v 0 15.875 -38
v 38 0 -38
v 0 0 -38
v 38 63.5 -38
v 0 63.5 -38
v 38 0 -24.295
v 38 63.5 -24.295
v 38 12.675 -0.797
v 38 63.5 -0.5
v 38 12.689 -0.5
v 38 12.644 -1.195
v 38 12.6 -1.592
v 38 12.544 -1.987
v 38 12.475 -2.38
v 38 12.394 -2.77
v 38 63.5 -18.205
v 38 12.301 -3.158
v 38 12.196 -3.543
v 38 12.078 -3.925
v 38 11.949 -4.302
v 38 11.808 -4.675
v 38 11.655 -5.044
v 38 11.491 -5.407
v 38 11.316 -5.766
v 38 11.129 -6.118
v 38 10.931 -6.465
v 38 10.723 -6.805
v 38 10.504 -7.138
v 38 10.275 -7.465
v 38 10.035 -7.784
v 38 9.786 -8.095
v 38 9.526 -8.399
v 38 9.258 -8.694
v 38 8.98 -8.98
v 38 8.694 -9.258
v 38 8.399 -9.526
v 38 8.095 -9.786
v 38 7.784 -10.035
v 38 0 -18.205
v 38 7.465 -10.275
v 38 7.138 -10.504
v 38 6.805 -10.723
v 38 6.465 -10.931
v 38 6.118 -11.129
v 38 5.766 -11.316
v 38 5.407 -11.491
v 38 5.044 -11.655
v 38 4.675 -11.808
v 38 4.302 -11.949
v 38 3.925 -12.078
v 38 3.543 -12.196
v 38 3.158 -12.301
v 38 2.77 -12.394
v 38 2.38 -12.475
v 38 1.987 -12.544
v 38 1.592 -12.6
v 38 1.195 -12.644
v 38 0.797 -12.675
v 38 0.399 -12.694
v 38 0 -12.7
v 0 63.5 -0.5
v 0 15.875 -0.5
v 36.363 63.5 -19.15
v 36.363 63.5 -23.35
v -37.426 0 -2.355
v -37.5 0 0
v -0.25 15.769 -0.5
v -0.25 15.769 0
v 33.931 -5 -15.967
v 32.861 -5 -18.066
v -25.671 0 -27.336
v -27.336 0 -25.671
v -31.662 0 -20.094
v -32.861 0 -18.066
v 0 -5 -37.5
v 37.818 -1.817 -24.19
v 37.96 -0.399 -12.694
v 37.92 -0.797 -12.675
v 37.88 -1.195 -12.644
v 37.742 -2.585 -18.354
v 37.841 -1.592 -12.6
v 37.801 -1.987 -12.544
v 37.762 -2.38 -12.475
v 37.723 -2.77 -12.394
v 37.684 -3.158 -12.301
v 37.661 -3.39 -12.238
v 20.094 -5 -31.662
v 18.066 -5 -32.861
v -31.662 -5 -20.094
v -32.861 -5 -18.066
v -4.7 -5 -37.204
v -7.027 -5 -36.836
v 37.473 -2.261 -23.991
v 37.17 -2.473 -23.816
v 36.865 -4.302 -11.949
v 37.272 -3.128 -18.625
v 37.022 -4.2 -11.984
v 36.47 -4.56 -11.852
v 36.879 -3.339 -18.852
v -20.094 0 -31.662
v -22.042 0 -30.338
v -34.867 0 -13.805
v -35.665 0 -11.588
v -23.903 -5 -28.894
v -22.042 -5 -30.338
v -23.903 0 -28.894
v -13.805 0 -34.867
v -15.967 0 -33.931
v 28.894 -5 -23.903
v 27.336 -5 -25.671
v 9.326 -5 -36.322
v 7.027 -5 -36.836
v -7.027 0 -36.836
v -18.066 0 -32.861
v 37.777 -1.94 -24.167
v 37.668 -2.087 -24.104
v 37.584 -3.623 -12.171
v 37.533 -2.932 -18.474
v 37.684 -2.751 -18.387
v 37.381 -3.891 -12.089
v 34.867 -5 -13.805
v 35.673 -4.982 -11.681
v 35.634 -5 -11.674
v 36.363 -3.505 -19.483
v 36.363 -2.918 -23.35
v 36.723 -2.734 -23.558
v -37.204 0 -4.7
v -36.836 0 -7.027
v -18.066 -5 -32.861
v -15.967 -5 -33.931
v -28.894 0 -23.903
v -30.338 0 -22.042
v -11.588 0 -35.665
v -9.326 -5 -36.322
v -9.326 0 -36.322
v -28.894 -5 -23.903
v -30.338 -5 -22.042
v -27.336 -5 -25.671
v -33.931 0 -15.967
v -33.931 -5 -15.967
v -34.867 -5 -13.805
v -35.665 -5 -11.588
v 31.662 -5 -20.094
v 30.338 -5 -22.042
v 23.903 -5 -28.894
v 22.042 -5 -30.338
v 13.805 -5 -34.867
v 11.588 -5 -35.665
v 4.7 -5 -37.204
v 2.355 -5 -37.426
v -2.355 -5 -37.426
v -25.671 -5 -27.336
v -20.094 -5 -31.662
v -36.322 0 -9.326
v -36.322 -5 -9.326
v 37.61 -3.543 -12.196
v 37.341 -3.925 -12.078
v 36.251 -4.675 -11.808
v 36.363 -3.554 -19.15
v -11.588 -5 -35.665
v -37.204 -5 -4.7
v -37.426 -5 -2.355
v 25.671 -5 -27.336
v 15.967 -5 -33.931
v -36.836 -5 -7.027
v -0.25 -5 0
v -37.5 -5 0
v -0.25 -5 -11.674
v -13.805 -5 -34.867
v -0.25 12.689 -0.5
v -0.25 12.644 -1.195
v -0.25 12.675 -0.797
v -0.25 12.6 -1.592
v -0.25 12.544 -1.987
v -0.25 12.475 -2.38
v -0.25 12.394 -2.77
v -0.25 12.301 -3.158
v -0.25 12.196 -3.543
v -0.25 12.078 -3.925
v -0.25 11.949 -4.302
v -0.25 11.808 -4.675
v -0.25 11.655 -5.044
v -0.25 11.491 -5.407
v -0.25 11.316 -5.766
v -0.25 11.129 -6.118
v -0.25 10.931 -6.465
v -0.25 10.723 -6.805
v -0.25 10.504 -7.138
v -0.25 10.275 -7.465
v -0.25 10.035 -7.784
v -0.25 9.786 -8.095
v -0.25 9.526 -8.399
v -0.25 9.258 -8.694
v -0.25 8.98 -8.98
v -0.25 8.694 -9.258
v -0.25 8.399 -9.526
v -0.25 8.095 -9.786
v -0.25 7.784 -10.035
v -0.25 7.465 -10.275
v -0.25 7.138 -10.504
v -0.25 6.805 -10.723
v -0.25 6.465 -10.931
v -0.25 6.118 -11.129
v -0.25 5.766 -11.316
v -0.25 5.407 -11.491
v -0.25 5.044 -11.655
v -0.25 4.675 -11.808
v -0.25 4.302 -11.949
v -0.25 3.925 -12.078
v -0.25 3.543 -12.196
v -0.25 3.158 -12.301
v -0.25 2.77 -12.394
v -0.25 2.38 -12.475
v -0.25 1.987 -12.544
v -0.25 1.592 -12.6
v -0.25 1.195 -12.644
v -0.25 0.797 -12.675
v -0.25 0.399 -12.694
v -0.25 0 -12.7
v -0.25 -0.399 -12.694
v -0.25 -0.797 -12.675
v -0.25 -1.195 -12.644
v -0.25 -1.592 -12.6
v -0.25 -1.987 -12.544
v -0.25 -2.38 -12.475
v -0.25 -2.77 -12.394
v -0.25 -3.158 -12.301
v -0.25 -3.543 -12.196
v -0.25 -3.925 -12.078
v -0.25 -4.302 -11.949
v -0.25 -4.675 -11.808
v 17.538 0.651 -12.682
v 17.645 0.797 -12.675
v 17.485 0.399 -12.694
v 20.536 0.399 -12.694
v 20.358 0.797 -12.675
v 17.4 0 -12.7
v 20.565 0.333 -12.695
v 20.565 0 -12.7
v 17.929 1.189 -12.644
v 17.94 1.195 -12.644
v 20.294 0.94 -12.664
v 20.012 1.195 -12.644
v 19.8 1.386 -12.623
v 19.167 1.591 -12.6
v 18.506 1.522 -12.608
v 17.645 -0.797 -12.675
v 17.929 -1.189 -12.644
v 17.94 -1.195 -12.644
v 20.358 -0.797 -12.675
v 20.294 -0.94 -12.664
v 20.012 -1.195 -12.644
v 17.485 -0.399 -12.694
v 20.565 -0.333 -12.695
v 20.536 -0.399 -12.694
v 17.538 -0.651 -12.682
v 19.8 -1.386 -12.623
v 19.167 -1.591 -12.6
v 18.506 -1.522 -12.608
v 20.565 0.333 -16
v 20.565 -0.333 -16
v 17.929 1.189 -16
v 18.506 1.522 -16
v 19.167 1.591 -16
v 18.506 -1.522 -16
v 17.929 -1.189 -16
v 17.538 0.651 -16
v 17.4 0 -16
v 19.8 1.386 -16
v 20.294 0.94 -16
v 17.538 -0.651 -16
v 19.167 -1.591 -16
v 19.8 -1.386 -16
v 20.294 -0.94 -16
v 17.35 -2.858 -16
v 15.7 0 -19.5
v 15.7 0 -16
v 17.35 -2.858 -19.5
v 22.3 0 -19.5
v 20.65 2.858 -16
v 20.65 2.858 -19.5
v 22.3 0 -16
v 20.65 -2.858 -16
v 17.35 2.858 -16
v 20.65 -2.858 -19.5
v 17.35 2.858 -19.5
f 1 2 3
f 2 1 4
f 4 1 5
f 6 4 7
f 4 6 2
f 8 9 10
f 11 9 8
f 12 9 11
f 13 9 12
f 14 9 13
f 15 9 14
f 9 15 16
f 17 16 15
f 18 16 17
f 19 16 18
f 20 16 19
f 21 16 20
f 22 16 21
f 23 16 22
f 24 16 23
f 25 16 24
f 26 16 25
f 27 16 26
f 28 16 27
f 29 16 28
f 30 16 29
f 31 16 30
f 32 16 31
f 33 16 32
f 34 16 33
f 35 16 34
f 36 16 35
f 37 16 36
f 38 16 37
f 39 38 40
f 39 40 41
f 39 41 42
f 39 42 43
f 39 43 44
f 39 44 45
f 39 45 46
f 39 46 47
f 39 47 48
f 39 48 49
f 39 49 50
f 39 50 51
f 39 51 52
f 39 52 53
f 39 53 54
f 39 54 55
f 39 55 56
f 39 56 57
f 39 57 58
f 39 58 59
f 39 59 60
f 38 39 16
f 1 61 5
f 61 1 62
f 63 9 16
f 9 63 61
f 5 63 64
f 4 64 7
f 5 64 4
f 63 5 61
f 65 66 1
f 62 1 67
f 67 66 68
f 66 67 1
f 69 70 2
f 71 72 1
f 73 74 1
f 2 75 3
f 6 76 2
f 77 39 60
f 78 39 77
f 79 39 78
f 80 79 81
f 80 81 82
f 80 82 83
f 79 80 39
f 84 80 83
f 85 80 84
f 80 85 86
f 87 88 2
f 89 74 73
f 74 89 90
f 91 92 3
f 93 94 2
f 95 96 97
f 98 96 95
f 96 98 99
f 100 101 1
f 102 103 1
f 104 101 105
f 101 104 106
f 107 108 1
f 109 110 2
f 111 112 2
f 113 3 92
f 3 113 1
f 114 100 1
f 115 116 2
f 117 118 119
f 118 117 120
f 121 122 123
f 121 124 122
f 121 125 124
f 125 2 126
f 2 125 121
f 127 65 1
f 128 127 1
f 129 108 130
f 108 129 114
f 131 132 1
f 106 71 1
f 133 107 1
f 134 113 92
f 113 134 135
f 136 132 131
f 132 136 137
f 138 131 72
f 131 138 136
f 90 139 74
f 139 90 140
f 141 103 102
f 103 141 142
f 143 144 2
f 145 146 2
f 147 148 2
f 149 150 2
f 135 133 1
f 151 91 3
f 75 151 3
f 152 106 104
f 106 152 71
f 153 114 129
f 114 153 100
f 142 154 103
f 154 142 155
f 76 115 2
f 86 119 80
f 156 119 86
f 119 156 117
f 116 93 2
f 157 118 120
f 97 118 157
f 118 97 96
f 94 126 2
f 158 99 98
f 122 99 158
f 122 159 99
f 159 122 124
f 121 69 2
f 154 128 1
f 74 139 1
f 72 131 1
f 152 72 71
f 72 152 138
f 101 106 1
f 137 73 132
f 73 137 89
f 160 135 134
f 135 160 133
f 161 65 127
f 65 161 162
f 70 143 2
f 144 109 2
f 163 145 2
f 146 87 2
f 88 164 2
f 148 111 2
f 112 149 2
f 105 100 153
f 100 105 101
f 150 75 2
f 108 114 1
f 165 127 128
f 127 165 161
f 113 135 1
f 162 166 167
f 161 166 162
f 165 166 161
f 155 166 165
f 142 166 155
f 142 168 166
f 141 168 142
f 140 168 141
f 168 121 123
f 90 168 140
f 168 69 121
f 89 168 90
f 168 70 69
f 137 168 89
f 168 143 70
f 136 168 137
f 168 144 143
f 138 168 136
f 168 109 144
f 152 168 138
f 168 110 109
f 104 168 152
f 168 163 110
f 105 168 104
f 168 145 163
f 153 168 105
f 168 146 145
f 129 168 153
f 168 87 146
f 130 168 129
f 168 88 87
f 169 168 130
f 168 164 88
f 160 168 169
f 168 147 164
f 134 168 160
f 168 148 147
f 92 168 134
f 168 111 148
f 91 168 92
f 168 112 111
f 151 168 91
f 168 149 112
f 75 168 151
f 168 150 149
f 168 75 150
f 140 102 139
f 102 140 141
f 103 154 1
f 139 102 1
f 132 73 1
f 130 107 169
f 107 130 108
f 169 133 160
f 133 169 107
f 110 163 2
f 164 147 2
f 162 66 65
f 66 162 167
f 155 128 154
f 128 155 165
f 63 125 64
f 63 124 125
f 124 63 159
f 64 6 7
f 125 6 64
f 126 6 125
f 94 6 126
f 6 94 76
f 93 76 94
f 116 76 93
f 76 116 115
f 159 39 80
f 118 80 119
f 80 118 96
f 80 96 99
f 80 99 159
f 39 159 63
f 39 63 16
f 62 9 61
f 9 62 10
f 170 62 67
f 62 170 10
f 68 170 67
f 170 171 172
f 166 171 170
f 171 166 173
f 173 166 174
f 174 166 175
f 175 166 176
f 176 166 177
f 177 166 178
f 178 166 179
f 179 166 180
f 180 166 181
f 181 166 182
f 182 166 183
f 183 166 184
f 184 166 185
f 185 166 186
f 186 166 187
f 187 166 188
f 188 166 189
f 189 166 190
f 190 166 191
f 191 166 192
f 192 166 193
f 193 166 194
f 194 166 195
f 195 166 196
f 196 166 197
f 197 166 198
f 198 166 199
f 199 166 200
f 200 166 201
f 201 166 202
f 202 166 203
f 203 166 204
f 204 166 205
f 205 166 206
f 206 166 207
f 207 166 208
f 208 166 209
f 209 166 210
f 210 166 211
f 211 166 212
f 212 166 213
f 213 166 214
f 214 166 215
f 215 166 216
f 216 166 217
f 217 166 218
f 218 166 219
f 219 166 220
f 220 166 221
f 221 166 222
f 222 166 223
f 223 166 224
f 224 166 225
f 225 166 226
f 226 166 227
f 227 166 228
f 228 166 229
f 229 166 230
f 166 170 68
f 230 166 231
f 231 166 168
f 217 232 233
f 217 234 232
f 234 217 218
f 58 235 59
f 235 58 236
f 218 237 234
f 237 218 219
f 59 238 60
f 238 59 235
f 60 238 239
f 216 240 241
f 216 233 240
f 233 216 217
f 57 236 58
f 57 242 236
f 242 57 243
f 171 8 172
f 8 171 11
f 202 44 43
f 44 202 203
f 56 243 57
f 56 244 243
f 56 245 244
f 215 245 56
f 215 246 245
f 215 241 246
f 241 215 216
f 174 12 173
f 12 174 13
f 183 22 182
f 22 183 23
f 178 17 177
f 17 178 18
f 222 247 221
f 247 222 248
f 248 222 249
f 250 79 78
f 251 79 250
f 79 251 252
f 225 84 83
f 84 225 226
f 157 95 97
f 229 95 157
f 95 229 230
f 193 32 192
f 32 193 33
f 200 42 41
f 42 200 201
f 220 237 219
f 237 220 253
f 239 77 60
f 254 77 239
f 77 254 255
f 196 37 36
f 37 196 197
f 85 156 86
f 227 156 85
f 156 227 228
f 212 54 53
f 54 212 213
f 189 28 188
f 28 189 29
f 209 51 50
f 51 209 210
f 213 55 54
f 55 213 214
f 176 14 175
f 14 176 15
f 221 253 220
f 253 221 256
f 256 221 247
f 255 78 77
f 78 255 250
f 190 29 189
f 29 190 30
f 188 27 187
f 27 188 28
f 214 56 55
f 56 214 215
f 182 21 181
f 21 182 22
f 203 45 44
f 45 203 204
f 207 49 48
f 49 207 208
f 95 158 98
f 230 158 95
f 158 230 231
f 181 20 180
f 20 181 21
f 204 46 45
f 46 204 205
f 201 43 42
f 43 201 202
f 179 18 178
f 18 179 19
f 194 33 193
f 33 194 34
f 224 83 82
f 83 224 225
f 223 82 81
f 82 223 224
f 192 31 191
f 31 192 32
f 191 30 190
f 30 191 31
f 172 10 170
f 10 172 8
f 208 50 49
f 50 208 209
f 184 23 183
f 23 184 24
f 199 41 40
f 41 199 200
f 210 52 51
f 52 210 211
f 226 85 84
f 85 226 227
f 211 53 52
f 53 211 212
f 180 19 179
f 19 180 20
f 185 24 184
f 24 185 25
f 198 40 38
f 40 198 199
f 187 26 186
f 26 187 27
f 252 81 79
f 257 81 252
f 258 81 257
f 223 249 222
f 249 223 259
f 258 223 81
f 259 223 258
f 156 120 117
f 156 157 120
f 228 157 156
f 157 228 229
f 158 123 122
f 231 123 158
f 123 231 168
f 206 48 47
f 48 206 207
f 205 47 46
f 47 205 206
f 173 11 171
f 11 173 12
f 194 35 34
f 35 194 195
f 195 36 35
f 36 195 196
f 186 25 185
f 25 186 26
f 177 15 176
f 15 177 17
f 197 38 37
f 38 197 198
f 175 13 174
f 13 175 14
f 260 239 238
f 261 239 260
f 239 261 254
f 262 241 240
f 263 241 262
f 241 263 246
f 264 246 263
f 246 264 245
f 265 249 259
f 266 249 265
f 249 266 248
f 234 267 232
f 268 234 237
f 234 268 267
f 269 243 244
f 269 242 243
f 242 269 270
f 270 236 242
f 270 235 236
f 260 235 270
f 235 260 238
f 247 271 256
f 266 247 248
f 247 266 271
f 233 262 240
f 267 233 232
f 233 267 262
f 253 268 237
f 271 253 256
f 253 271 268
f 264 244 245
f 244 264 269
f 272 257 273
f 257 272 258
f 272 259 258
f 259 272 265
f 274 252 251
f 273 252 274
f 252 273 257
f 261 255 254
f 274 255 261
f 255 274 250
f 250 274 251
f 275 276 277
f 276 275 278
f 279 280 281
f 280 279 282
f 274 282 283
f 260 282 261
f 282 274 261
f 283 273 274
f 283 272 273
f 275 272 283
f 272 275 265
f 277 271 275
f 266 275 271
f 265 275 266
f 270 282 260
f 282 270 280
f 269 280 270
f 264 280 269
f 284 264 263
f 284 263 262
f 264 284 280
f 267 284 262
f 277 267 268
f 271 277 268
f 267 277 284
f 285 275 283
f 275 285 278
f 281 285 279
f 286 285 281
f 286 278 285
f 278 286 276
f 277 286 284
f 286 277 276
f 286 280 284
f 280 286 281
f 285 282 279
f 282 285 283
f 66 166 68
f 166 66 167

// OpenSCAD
// file: ../888_2003.scad
include <../parameters.scad>

module 888_2003 (coupling_wall_thickness, thickness_between_tubes,draft = true){

//modifikace spojky 666_1004

    bevelled_width = main_tube_outer_diameter + 2*coupling_wall_thickness;

    magnet_displacement = 40;
    wall_thickness = 5;
    screw_length = 30;
    magnet_diameter = 75;
    distance_between_screws = 42.5;


    difference(){

        union(){
            translate([-(coupling_width_666_1004/2), - depth_666_1004 + main_tube_outer_diameter/2 + coupling_wall_thickness,0])
                  cube([coupling_width_666_1004, depth_666_1004, height_666_1004]);


            hull(){

                translate([-(coupling_width_666_1004/2), - depth_666_1004 + main_tube_outer_diameter/2 + coupling_wall_thickness,0])
                      cube([coupling_width_666_1004, depth_666_1004/4, height_666_1004]);

                translate([0, - depth_666_1004 + main_tube_outer_diameter/2 + coupling_wall_thickness , magnet_displacement])
                    rotate([90, 0, 0])
                        cylinder(d = magnet_diameter, h = 5, $fn = draft?50:100);
            }

        }

        // middle cut
        translate ([-0.5, -depth_666_1004 , - global_clearance/2])
            cube ([1, 3*depth_666_1004 + global_clearance, 3* height_666_1004 + global_clearance]);

        //tubes
        translate([0,0,- global_clearance/2])
                cylinder(h = height_666_1004 + global_clearance,r = main_tube_outer_diameter/2, $fn= draft ? 50 : 200);

        //screw
        translate([-coupling_width_666_1004/2 - global_clearance/2,0,height_666_1004/2])
           rotate ([0,90,0])   
                cylinder(h = coupling_width_666_1004 + global_clearance, r = M3_screw_diameter/2, $fn = 15);
                
        //nut
        translate([-coupling_width_666_1004/2 - global_clearance/2,0, height_666_1004/2])
            rotate ([0,90,0])
                cylinder (h = M3_screw_head_height + global_clearance, r = M3_nut_diameter/2, $fn = 6);
        
        translate([coupling_width_666_1004/2 - M3_screw_head_height,0,height_666_1004/2])
           rotate ([0,90,0])
                cylinder (h = M3_screw_head_height + global_clearance, r = M3_nut_diameter/2, $fn = 6);

        translate([distance_between_screws/2, - depth_666_1004 + main_tube_outer_diameter/2, magnet_displacement]) 
            rotate([-90, 0, 0])
            {
                cylinder(d = M4_screw_diameter, h = 10 + global_clearance, $fn=50);
                translate([0,0,5])
                   cylinder(d = M4_nut_diameter, h = 50 * M4_nut_height, $fn = 6);
            }

        translate([- distance_between_screws/2,- depth_666_1004 + main_tube_outer_diameter/2 , magnet_displacement])
            rotate([-90, 0, 0])
            { 
                cylinder(d = M4_screw_diameter, h = 10 + global_clearance, $fn = 50);
                translate([0,0,5])
                    cylinder(d = M4_nut_diameter, h = 50 * M4_nut_height, $fn = 6);
            }


    }

}


888_2003 (coupling_wall_thickness, thickness_between_tubes, draft = true);
// main file
include <../../parameters.scad>

use <../888_2003.scad>

difference(){
    rotate([0,90,0])
        888_2003(draft=false);
    translate([-50,-50,0])
        cube(150);
}
